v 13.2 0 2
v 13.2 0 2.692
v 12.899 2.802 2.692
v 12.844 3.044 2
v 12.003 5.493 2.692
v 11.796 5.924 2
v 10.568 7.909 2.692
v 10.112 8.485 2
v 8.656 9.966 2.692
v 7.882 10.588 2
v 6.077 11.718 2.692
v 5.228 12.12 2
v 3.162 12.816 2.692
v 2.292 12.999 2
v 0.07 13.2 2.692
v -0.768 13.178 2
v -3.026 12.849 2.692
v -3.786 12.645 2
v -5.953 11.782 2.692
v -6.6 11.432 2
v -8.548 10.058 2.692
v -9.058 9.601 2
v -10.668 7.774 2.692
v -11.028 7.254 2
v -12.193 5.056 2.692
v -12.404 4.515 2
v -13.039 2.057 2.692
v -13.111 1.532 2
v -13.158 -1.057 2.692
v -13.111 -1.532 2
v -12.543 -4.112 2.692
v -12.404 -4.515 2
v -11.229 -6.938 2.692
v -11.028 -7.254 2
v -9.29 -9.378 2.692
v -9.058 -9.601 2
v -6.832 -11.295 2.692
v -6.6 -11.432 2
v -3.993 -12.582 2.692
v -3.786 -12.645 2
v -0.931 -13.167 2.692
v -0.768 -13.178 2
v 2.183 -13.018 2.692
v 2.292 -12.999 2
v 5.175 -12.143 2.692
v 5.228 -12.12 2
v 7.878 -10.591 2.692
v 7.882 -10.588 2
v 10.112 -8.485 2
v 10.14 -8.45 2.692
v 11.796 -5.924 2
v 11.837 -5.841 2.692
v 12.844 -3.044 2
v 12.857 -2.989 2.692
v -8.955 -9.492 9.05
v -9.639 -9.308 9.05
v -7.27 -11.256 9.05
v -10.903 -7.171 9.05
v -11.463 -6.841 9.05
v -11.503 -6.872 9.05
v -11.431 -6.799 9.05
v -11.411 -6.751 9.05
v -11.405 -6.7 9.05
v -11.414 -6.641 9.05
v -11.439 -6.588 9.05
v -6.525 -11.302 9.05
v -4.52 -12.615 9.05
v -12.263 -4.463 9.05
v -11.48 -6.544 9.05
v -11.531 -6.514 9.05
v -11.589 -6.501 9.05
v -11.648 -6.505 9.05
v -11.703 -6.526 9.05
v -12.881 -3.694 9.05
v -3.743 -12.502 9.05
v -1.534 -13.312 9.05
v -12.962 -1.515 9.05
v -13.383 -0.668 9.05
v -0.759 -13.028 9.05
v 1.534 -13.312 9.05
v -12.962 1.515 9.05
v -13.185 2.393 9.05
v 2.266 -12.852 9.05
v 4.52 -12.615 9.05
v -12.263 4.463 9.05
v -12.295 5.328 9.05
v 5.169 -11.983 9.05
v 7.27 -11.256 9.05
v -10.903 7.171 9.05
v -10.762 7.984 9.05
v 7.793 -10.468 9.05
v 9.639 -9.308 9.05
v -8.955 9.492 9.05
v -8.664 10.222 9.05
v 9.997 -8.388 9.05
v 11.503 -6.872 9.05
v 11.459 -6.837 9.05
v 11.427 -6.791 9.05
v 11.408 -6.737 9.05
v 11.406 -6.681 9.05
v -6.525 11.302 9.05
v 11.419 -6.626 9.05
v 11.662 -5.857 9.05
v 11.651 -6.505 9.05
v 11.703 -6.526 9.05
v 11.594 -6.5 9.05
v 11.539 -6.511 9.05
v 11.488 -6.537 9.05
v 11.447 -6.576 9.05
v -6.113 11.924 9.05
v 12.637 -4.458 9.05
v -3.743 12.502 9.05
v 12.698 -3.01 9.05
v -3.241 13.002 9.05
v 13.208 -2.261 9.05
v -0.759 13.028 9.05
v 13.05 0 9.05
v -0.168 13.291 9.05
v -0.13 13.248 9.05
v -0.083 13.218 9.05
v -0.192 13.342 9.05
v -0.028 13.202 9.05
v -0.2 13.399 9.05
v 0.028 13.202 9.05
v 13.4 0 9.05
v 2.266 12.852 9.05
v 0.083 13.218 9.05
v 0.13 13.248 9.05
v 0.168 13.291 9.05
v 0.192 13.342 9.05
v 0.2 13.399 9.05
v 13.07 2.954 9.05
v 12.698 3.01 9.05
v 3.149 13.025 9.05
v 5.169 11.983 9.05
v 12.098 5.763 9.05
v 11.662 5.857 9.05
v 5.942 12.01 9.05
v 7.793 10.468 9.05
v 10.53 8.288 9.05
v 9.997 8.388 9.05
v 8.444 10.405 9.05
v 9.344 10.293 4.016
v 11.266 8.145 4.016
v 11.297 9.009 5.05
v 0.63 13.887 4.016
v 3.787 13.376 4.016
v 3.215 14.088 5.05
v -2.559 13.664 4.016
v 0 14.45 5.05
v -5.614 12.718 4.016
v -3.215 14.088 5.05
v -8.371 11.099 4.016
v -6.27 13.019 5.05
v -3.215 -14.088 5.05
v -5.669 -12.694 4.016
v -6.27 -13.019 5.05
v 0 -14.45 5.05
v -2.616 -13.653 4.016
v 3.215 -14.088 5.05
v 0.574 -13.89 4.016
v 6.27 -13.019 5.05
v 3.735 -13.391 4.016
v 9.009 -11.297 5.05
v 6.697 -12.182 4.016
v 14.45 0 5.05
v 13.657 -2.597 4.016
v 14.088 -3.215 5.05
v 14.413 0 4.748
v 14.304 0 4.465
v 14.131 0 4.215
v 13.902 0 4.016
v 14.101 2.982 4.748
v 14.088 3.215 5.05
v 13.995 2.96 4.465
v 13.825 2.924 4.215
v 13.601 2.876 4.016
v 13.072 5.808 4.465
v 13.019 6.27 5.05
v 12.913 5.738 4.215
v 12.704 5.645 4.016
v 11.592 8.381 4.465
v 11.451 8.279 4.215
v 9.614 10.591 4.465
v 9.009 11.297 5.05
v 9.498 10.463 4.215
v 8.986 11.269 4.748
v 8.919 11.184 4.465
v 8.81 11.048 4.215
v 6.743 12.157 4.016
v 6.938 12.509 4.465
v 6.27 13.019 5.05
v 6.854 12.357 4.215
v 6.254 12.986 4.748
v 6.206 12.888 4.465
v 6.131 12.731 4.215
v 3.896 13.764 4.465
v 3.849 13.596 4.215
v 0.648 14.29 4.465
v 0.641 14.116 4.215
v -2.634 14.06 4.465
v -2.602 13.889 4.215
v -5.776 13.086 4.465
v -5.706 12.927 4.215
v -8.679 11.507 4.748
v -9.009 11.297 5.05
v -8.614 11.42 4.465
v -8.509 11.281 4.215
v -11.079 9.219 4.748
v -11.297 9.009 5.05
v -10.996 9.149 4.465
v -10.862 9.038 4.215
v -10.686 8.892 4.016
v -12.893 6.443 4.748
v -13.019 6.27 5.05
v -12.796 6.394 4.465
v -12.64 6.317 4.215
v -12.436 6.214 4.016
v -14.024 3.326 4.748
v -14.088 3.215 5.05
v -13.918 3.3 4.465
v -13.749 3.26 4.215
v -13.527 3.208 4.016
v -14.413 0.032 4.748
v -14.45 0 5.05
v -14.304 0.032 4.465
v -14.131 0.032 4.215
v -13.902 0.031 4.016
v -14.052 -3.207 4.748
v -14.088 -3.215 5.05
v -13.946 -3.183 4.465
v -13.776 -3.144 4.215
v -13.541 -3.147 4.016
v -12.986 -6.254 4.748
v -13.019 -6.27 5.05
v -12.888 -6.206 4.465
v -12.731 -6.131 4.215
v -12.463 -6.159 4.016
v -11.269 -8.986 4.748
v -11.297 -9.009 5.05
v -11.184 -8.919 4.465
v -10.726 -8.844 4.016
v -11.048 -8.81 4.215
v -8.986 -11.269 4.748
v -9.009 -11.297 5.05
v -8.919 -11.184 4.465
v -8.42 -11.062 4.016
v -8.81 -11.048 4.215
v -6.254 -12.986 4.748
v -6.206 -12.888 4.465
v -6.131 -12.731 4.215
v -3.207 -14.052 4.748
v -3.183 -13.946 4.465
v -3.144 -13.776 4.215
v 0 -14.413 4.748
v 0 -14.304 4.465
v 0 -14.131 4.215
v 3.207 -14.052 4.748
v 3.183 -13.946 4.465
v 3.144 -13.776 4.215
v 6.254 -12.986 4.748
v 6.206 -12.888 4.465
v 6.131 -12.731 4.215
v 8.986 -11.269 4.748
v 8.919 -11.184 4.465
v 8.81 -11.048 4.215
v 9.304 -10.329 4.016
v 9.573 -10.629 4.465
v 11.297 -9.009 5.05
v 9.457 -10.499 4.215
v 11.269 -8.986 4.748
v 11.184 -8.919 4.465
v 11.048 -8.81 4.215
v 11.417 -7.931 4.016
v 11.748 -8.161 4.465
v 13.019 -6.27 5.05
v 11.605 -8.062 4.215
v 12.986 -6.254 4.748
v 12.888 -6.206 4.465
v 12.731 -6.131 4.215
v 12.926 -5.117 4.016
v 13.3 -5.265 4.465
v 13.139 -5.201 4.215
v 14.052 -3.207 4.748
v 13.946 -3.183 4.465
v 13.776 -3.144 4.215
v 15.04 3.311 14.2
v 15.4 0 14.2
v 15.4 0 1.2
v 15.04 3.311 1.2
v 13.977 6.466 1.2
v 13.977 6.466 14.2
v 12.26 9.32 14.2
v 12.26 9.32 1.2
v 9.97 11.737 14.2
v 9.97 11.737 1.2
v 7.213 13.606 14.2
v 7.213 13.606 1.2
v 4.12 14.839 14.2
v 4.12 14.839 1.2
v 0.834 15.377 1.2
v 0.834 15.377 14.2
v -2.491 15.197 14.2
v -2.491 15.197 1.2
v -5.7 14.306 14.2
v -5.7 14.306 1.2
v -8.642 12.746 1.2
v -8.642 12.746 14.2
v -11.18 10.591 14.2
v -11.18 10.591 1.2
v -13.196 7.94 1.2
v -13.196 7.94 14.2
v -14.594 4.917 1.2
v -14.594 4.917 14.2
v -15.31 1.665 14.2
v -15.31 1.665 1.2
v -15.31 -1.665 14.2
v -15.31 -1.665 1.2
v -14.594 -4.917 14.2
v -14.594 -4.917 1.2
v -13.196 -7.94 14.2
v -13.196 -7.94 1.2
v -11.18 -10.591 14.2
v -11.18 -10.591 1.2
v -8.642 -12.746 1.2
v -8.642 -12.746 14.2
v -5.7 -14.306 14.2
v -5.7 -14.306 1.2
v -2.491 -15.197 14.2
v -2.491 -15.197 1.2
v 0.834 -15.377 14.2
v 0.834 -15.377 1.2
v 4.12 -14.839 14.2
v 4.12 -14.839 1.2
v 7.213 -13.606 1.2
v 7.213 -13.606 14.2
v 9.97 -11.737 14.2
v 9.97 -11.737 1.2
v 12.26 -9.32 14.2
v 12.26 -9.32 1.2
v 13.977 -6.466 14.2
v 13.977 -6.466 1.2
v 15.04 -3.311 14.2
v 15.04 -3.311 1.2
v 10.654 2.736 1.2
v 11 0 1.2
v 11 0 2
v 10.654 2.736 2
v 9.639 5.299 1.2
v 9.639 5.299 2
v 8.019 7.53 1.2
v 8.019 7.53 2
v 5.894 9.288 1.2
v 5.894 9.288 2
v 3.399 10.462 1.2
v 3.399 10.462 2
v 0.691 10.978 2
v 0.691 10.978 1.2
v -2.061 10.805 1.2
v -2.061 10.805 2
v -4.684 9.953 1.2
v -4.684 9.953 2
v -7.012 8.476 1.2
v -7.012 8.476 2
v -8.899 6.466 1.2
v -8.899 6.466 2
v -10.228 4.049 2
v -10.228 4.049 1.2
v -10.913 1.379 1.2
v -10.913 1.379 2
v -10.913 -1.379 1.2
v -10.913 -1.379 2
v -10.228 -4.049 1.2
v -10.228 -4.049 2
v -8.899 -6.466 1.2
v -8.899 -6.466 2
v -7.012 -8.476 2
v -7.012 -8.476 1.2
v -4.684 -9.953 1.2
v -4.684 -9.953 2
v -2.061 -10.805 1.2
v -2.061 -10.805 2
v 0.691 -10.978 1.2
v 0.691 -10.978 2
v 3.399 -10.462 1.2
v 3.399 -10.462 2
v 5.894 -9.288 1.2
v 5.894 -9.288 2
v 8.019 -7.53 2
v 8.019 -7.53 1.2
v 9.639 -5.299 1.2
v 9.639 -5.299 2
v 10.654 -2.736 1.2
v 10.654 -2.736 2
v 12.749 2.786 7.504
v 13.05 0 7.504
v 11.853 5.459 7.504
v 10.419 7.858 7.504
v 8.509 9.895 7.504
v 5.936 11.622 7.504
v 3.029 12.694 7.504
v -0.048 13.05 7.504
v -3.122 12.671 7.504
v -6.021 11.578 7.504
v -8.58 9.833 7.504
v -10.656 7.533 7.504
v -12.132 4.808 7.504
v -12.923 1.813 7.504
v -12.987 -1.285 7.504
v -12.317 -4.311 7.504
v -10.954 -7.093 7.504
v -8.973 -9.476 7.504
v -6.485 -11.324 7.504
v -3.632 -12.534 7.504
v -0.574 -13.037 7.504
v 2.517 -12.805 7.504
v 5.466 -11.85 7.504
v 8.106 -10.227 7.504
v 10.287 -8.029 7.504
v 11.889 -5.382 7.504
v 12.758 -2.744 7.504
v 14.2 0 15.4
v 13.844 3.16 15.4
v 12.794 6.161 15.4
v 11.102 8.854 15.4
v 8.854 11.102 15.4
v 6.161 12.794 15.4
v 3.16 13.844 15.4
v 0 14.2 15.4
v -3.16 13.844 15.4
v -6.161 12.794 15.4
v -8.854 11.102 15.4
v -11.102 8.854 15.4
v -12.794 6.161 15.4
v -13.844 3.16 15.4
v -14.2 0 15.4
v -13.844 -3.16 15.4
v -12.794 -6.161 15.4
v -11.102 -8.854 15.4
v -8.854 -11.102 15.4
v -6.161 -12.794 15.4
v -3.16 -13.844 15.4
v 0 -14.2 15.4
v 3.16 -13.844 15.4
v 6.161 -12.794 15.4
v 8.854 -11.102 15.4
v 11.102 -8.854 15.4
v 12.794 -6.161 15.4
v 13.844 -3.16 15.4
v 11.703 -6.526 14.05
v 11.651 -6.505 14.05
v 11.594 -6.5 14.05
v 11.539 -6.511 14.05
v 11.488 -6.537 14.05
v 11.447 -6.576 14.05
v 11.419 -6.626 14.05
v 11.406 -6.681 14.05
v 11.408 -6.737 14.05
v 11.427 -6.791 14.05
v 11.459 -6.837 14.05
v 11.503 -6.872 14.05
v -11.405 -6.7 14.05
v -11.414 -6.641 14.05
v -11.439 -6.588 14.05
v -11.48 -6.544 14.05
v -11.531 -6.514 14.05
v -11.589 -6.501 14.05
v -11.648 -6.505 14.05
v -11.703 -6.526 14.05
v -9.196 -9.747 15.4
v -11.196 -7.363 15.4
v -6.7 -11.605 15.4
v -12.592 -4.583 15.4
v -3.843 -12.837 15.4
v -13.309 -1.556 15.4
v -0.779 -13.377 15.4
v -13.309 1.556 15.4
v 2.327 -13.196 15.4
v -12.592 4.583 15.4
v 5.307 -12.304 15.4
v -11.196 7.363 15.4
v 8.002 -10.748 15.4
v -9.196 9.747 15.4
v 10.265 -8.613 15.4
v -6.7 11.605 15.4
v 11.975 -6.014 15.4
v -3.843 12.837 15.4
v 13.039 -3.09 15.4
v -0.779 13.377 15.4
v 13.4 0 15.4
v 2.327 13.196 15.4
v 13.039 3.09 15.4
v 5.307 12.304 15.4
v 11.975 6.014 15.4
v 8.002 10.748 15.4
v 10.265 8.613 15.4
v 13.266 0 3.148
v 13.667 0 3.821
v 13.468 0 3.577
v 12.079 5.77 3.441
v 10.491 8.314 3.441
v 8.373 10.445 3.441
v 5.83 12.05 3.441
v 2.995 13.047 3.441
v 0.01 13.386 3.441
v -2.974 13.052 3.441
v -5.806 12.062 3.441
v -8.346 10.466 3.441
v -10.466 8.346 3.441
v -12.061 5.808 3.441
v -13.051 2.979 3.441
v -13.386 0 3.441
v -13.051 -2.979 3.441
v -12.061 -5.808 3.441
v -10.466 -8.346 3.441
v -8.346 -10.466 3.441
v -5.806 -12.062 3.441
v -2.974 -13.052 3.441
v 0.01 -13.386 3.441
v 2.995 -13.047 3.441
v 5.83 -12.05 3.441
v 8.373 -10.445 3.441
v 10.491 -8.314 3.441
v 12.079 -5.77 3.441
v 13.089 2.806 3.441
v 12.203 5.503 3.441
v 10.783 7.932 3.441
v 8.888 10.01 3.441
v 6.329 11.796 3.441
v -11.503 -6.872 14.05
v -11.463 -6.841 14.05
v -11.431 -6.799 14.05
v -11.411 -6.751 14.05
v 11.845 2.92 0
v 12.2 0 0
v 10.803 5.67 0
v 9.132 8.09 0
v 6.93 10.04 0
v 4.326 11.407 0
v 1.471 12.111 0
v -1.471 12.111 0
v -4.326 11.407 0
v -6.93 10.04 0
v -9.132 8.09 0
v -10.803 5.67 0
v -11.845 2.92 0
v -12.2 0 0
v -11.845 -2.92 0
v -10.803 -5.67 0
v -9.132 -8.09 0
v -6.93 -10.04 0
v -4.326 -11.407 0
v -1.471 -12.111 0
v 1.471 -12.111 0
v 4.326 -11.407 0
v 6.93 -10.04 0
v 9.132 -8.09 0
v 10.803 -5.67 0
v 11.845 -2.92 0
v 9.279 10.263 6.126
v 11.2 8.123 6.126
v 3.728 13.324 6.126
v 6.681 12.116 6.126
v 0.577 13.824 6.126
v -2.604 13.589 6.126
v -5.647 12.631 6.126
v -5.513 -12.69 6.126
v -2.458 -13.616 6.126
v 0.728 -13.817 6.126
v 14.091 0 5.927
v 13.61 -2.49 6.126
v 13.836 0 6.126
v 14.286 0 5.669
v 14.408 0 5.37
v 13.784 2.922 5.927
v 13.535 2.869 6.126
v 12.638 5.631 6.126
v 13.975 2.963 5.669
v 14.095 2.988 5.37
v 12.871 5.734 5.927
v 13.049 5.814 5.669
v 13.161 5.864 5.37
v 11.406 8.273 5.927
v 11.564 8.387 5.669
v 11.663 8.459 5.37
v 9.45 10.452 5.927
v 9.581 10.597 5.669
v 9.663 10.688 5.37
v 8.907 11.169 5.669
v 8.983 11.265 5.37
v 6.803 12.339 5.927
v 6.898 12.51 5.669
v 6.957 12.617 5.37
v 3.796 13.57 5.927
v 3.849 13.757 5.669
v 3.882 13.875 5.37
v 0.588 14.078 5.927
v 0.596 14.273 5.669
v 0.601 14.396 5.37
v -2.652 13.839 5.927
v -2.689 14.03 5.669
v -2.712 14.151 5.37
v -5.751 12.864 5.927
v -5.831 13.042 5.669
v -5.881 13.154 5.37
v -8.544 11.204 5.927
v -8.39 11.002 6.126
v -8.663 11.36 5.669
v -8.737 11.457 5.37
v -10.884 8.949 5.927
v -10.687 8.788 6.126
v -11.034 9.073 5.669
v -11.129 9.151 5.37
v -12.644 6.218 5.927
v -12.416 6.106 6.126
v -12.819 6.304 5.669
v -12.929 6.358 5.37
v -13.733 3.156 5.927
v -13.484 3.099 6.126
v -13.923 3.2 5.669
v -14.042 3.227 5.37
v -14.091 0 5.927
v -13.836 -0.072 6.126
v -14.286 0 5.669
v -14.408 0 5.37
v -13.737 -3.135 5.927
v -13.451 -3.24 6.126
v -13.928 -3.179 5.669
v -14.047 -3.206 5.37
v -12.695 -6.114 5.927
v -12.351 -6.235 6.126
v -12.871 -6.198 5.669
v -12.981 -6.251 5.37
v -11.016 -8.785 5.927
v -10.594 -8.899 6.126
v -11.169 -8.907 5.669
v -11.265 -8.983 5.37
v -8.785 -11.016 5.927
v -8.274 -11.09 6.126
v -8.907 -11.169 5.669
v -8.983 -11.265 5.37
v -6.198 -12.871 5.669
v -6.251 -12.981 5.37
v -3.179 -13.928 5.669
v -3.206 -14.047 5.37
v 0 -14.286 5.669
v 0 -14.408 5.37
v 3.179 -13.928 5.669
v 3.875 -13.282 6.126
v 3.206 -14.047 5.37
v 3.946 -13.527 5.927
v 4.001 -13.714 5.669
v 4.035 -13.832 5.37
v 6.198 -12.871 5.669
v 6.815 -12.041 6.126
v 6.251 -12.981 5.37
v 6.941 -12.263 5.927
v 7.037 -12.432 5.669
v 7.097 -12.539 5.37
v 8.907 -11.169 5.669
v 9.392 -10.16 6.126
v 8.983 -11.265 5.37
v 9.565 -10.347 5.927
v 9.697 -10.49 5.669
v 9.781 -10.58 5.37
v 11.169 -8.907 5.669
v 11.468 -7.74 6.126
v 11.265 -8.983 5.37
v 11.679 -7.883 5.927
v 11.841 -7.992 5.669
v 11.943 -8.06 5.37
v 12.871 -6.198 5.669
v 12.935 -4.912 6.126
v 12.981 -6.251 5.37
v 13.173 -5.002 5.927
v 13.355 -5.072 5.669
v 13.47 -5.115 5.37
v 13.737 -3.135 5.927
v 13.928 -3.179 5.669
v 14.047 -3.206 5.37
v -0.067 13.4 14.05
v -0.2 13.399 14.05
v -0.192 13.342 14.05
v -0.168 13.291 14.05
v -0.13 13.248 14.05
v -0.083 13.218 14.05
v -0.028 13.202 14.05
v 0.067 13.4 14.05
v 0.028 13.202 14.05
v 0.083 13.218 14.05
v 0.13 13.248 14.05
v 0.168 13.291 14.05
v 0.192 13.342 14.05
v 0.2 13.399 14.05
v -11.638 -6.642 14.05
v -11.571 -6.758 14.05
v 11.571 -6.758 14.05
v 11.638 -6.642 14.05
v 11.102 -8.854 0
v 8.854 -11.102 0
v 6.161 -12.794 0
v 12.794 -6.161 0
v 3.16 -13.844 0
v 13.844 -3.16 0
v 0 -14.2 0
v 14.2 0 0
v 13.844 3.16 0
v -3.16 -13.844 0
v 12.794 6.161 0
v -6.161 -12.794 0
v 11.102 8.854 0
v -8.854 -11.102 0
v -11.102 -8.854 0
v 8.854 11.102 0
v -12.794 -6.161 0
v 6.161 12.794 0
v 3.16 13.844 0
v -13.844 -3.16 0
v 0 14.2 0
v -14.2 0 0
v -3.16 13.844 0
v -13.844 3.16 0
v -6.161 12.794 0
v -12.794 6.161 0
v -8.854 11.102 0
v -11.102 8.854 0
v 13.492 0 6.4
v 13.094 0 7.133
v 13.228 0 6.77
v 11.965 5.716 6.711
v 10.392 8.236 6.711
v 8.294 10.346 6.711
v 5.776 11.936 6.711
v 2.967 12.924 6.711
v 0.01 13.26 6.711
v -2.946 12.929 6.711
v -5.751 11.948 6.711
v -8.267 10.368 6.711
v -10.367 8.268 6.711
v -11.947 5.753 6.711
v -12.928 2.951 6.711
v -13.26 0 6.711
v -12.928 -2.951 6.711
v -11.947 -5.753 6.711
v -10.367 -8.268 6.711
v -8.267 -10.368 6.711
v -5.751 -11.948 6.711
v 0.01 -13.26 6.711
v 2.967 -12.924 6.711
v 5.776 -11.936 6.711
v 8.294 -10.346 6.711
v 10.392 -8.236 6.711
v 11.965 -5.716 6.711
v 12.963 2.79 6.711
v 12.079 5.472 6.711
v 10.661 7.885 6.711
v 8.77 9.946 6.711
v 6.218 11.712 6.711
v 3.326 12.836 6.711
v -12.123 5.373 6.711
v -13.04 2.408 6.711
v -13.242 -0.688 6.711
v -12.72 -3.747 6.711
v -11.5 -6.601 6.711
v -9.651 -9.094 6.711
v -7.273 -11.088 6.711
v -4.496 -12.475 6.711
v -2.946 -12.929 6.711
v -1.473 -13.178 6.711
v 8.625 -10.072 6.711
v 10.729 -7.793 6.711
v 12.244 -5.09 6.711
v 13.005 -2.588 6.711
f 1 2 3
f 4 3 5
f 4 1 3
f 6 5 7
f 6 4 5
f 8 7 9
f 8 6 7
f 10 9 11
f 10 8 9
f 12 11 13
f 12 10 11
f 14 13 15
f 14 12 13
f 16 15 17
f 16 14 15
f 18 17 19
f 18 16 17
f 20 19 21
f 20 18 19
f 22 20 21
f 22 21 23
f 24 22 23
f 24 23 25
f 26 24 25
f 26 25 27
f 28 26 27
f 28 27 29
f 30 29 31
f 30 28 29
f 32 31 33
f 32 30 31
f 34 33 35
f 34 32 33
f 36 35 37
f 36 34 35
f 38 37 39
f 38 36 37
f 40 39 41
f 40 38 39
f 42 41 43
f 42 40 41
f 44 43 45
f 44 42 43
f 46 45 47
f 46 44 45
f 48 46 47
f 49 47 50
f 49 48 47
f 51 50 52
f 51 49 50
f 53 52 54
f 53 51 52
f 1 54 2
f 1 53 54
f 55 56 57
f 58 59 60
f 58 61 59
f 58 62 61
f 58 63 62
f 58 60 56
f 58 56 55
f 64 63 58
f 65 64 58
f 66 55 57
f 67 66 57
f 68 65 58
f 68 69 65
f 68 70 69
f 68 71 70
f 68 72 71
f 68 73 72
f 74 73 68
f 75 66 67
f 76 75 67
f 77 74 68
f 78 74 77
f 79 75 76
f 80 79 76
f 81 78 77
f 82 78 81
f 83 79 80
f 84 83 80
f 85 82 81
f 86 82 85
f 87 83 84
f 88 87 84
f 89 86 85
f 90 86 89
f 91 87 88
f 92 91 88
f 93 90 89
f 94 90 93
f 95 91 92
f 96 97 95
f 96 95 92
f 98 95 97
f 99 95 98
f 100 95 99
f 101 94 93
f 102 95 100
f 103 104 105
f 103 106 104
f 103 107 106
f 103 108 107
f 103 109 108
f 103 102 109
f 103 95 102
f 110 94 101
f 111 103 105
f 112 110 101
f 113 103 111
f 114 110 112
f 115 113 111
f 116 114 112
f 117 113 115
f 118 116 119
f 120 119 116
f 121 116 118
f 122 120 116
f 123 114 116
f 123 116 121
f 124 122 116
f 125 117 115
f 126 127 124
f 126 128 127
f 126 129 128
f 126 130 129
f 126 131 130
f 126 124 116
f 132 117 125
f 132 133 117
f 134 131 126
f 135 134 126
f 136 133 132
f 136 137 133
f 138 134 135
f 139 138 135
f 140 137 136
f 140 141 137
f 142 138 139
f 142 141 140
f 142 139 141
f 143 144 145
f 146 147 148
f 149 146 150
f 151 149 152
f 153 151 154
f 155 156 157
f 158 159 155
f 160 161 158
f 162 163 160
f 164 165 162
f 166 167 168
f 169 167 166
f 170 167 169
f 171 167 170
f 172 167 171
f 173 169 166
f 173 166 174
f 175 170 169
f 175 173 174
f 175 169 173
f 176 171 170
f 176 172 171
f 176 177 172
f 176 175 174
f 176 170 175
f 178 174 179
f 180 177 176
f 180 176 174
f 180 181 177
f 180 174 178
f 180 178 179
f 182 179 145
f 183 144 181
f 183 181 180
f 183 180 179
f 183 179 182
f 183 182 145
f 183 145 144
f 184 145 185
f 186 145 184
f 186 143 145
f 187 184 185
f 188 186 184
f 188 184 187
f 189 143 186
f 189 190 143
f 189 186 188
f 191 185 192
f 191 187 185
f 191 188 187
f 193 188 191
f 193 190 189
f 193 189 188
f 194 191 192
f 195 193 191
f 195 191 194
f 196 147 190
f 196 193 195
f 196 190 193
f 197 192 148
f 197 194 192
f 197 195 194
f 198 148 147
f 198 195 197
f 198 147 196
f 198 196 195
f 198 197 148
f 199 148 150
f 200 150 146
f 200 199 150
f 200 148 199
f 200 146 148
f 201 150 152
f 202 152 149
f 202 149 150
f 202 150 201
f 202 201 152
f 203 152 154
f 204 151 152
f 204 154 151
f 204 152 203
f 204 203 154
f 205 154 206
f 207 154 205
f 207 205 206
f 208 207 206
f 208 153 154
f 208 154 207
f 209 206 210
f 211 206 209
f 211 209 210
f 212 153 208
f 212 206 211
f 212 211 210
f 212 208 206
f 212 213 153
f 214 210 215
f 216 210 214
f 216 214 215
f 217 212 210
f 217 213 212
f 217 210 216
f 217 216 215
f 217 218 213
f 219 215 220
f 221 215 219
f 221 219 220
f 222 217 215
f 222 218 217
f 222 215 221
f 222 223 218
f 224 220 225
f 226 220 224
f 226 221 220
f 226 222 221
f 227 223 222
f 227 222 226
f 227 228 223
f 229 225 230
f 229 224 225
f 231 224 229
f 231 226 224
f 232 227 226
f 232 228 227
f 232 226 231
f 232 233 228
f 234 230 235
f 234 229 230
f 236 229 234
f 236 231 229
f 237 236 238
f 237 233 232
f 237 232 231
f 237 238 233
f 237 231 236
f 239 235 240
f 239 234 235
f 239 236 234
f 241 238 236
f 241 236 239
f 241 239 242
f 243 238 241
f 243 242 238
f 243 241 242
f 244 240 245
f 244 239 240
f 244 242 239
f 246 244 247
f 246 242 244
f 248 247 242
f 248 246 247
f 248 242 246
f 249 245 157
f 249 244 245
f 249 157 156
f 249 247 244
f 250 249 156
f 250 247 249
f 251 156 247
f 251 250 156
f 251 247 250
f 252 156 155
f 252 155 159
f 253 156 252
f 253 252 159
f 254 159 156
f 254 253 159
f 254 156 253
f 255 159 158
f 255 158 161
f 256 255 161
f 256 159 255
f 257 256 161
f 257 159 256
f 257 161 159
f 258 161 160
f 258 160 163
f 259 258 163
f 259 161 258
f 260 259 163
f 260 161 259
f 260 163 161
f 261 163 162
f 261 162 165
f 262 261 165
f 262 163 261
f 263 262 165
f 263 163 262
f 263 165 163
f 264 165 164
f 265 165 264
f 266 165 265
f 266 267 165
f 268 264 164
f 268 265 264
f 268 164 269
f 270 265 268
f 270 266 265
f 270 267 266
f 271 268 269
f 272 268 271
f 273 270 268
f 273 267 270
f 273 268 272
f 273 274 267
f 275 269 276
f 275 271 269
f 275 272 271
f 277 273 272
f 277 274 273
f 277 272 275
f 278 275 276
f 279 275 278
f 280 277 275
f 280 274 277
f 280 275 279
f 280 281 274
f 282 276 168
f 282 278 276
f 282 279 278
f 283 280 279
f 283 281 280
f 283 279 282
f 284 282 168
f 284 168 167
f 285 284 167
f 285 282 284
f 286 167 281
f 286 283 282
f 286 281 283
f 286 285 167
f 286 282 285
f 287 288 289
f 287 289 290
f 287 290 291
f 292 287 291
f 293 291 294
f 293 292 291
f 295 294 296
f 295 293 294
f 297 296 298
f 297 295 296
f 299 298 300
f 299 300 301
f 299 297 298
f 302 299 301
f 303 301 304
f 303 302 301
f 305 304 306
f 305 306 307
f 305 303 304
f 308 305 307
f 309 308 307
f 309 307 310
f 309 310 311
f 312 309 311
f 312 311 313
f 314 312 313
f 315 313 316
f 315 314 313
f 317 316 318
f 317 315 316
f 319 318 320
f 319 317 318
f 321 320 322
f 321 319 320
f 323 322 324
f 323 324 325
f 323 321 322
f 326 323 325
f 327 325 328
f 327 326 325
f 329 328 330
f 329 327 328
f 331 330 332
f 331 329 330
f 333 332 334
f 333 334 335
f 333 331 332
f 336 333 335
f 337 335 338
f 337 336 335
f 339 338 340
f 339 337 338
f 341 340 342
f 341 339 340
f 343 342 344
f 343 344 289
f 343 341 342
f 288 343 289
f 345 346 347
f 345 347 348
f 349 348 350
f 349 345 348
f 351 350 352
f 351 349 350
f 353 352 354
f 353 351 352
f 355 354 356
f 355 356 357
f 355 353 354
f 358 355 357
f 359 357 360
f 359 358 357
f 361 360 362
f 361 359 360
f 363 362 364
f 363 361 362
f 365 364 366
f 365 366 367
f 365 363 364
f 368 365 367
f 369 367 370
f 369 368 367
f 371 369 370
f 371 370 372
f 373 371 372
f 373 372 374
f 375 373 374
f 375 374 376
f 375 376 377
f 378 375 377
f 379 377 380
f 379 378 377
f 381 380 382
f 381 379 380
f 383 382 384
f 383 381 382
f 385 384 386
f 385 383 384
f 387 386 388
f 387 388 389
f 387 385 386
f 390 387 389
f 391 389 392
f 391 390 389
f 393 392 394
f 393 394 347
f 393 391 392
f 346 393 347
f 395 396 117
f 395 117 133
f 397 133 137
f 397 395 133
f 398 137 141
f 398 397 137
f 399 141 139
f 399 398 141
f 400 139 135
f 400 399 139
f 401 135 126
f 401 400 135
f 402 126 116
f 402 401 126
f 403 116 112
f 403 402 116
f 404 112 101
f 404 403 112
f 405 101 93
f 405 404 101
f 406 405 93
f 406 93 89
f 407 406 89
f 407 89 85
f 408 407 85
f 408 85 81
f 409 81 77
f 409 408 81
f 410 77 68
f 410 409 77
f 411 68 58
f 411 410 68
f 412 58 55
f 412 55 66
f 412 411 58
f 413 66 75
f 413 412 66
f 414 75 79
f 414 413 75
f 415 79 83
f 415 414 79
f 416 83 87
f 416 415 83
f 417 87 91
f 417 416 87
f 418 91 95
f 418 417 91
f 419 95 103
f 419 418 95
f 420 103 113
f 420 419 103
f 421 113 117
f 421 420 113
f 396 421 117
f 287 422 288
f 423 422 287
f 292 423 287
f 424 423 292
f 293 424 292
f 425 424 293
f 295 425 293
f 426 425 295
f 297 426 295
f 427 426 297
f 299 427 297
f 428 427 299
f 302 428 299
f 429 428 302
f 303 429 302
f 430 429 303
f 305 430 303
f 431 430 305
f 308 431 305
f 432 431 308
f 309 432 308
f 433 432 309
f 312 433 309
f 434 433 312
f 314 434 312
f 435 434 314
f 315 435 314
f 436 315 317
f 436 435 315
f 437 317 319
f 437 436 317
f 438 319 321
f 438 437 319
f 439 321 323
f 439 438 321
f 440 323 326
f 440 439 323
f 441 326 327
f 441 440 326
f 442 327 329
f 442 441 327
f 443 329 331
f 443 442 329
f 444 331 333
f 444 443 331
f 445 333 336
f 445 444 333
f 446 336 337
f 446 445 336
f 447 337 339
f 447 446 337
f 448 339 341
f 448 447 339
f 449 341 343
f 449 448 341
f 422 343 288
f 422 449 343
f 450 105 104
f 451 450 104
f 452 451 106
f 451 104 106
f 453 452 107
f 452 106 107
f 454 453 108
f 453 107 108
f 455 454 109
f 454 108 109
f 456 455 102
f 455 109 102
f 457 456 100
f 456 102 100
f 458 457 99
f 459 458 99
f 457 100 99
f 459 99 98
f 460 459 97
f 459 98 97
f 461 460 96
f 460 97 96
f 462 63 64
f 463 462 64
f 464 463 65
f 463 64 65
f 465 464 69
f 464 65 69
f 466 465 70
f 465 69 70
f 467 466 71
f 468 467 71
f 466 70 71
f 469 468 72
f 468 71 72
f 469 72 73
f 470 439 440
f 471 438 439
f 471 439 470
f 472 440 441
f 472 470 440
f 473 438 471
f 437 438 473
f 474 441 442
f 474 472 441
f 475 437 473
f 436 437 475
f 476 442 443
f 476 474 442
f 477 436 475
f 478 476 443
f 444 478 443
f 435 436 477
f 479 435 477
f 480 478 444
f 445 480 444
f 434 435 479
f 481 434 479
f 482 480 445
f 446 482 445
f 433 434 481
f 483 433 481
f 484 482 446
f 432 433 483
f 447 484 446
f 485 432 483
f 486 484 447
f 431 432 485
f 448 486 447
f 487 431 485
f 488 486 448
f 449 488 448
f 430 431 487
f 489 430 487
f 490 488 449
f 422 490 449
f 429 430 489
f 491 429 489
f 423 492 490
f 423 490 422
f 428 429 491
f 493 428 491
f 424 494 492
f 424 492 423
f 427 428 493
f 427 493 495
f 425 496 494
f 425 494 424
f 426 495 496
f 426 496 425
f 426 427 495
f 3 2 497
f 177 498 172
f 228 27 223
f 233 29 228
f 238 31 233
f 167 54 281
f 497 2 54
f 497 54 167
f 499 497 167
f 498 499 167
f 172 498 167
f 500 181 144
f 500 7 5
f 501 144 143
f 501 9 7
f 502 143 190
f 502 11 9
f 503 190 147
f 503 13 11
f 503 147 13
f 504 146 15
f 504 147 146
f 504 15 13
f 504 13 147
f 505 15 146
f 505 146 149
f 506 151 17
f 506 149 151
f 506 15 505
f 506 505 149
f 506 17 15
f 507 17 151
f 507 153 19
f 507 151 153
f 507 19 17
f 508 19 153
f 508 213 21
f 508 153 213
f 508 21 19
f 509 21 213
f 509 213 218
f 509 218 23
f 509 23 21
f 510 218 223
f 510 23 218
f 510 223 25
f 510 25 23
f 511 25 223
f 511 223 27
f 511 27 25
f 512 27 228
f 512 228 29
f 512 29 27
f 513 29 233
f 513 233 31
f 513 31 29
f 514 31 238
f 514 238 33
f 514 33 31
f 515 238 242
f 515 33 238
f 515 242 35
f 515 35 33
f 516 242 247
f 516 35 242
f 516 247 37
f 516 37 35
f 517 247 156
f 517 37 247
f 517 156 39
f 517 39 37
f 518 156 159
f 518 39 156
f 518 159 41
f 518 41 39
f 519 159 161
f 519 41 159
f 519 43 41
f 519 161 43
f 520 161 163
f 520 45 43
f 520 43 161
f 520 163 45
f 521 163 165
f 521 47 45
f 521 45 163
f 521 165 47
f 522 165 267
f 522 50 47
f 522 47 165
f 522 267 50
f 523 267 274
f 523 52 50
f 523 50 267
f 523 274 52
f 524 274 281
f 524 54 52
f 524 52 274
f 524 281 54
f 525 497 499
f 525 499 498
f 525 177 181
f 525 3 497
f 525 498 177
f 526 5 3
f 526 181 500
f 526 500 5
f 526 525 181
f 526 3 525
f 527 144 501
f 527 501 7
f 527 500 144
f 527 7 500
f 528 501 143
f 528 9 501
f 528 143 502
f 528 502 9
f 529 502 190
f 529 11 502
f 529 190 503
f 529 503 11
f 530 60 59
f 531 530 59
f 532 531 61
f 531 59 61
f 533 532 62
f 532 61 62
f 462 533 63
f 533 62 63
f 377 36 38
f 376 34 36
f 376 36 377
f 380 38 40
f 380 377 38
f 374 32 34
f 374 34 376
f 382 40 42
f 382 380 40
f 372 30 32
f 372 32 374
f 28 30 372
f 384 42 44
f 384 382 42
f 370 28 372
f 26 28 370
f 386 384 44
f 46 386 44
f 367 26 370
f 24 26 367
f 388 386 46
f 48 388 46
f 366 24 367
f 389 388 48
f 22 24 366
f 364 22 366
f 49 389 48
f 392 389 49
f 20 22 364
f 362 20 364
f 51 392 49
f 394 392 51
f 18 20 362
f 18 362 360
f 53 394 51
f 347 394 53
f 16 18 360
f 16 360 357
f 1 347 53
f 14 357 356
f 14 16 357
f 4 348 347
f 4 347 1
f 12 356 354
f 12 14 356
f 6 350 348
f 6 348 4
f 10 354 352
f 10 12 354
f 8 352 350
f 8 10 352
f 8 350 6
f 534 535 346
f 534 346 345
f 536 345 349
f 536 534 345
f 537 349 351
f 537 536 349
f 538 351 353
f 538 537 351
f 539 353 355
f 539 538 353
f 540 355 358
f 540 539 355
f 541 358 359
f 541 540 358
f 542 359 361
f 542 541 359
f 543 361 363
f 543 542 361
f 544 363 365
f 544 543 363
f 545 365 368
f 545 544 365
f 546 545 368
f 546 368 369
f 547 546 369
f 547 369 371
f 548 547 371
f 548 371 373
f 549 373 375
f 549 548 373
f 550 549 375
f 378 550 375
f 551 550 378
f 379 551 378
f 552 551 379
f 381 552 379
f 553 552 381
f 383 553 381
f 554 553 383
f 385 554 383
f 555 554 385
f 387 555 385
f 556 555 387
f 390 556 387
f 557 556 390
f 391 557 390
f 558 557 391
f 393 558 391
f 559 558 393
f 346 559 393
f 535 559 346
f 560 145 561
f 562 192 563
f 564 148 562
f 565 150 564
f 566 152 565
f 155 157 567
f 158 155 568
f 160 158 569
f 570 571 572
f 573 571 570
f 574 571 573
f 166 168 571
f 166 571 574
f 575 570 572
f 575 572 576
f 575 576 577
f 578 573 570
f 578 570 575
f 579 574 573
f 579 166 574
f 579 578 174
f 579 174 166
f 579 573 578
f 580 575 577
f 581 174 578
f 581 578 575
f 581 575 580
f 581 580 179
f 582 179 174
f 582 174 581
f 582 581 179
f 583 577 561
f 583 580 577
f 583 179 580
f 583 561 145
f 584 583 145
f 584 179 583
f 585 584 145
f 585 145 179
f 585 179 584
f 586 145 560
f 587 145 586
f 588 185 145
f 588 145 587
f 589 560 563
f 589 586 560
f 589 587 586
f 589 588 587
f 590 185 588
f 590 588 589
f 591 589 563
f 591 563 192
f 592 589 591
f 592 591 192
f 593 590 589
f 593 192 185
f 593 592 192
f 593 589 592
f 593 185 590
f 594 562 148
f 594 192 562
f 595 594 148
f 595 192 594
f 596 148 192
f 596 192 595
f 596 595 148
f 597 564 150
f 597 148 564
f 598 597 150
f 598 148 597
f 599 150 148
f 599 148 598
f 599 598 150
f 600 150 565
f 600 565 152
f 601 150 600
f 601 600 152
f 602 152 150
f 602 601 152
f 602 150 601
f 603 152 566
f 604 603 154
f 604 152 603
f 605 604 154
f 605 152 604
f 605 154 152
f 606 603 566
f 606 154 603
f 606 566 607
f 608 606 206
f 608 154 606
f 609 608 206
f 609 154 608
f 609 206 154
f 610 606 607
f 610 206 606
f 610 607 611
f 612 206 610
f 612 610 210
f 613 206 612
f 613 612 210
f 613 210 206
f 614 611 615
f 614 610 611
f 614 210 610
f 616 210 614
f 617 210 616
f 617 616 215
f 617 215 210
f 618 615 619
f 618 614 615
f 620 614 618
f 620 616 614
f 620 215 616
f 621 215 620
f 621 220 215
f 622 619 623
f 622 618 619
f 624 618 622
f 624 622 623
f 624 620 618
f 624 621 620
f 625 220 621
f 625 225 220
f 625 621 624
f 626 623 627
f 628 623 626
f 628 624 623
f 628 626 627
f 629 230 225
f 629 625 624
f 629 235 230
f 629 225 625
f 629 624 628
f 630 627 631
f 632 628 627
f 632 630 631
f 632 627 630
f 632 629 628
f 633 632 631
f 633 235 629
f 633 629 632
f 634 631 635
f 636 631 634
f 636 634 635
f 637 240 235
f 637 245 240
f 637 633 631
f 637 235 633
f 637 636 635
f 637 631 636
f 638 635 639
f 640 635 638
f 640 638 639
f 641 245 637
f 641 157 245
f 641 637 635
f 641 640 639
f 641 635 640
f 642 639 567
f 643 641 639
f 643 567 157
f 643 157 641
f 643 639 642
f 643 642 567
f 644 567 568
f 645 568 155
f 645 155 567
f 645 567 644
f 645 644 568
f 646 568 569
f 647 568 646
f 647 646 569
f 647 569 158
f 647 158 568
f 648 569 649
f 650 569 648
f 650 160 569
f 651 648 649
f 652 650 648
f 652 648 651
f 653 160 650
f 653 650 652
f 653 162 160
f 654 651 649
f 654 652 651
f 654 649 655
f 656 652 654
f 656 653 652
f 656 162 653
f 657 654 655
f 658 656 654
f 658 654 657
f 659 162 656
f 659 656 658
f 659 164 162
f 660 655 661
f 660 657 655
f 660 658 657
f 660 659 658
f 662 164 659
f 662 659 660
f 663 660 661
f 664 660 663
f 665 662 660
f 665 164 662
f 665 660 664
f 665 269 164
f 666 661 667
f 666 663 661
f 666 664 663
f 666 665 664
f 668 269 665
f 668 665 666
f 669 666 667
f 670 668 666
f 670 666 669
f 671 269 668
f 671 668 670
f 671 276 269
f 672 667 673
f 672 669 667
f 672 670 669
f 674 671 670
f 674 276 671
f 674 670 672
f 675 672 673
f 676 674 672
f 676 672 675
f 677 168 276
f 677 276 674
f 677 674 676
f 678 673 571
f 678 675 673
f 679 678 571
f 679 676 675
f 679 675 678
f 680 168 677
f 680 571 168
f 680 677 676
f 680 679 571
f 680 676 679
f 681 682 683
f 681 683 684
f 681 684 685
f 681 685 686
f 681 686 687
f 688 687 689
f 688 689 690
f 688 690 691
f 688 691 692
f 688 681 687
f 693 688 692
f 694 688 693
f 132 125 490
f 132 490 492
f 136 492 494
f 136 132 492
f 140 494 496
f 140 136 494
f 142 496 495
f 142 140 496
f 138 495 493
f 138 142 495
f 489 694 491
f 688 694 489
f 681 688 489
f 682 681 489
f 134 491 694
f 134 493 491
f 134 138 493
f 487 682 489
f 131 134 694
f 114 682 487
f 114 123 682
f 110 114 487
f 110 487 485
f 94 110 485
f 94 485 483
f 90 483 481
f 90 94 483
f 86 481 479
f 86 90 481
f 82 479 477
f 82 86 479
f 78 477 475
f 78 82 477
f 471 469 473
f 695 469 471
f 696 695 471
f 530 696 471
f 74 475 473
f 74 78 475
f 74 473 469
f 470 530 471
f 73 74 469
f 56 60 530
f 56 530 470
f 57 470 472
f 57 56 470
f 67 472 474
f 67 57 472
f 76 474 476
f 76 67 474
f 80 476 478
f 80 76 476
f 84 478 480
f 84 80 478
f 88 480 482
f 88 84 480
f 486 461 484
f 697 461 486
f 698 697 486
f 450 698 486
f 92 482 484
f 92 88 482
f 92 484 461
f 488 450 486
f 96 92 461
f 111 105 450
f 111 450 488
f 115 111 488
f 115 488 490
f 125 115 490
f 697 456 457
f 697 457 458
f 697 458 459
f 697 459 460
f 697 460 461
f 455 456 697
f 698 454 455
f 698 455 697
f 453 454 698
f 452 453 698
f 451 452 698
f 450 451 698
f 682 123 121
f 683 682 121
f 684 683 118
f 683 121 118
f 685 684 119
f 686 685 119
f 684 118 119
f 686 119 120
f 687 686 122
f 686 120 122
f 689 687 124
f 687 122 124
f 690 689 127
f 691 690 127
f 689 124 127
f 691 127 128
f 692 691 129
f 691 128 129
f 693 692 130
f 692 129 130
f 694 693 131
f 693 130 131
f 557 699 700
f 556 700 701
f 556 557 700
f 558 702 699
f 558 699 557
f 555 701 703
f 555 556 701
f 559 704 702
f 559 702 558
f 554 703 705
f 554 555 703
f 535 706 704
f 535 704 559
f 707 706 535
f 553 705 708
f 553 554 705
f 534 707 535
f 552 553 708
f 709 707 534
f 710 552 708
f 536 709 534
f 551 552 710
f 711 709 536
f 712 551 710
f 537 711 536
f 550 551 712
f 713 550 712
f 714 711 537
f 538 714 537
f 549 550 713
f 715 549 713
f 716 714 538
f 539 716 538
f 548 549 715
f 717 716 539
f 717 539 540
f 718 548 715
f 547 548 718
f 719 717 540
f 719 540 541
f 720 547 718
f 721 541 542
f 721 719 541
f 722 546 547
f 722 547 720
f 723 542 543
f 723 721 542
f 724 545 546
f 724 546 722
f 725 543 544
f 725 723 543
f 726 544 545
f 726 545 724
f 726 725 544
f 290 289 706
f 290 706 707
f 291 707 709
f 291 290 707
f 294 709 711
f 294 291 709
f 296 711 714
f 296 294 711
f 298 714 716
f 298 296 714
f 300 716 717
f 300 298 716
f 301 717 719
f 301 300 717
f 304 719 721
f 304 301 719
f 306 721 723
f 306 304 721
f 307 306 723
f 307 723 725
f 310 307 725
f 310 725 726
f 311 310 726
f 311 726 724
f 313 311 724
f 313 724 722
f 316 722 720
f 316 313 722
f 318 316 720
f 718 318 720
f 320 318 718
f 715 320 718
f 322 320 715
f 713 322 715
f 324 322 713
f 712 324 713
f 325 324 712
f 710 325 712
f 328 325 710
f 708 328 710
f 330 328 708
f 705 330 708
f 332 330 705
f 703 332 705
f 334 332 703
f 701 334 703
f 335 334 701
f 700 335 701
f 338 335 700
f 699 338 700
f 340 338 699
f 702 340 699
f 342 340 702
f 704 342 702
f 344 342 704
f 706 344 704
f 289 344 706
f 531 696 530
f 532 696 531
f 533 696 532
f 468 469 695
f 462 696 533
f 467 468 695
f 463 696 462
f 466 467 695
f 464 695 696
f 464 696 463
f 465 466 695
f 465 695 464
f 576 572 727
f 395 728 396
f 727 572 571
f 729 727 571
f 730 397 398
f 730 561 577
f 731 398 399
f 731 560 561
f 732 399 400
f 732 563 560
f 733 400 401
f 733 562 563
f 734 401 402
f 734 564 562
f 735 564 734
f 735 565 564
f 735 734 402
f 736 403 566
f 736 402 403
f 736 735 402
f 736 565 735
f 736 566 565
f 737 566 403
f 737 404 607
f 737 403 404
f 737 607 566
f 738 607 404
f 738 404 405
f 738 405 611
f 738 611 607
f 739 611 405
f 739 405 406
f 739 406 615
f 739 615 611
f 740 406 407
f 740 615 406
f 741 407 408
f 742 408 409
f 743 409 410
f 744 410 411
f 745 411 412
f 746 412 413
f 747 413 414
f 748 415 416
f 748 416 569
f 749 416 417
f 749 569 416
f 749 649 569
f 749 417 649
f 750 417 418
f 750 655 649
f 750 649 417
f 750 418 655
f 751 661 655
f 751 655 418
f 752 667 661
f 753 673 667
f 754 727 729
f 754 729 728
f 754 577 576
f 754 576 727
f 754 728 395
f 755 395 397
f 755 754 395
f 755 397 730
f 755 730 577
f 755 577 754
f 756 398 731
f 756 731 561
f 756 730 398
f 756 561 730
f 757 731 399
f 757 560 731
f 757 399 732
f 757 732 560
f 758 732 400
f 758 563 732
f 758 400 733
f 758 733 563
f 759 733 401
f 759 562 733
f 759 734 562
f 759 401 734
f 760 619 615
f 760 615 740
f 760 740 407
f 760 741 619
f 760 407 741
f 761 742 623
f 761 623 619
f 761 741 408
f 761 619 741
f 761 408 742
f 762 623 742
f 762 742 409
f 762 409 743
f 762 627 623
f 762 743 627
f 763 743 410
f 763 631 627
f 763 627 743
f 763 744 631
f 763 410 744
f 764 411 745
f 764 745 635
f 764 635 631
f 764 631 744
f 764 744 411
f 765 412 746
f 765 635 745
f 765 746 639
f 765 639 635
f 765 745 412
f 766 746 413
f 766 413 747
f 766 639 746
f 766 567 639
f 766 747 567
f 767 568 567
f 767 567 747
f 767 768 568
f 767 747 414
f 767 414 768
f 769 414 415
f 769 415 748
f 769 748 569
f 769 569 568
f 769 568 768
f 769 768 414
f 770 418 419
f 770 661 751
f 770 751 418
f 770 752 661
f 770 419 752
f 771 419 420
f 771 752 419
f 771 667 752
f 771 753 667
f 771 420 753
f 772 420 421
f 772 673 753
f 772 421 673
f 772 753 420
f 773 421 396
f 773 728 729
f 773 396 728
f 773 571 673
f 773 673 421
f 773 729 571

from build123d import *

# Parameters (mm, degrees)
F2_SIZE  = 1.2
F3_R     = 1.6
F5_DEPTH = 5


# Not quite as in the source:
# - a feature names something its author has since deleted; it is built from what else it names


with BuildPart() as f1:
    # F0 (on Front) → F1 (revolve)
    with BuildSketch(Plane.XZ):
        with BuildLine():
            ThreePointArc((13.05, 6.2909673646), (14.0291561976, 5.9854143467), (14.45, 5.05))
            ThreePointArc((14.45, 5.05), (14.0838834765, 4.1661165235), (13.2, 3.8))
            Line((13.2, 3.8), (13.2, 2))
            Line((13.2, 2), (11, 2))
            Line((11, 2), (11, 0))
            Line((11, 0), (15.4, 0))
            Line((15.4, 0), (15.4, 15.4))
            Line((15.4, 15.4), (13.4, 15.4))
            Line((13.4, 15.4), (13.4, 9.05))
            Line((13.4, 9.05), (13.05, 9.05))
            Line((13.05, 9.05), (13.05, 6.2909673646))
        make_face()
    revolve(axis=Axis((0, 0, 9.4043305144), (0, 0, 1)))

    # F2
    f2_edges = [f1.edges().sort_by_distance(p)[0] for p in [
        (-11, 0, 0),
        (-15.4, 0, 0),
        (-15.4, 0, 15.4),
    ]]
    chamfer(f2_edges, length=F2_SIZE)

    # F3
    f3_edges = [f1.edges().sort_by_distance(p)[0] for p in [
        (-13.05, 0, 6.290967),
        (-13.2, 0, 3.8),
    ]]
    fillet(f3_edges, radius=F3_R)

    # F4 (on face) → F5 (join)
    with BuildSketch(Plane.XY.offset(9.05)):
        with BuildLine():
            ThreePointArc((0.1999944308, 13.3985074627), (0.1999986077, 13.3992537261), (0.2, 13.4))
            ThreePointArc((0.2, 13.4), (-0.0007462739, 13.5999986077), (-0.1999944308, 13.3985074627))
            ThreePointArc((-0.1999944308, 13.3985074627), (0, 13.4), (0.1999944308, 13.3985074627))
        make_face()
        with BuildLine():
            ThreePointArc((0.1999944308, 13.3985074627), (0, 13.4), (-0.1999944308, 13.3985074627))
            ThreePointArc((-0.1999944308, 13.3985074627), (0, 13.2), (0.1999944308, 13.3985074627))
        make_face()
        with BuildLine():
            ThreePointArc((-11.4047404107, -6.7), (-11.5040948148, -6.527169262), (-11.7034450509, -6.5260534737))
            ThreePointArc((-11.7034450509, -6.5260534737), (-11.6047404107, -6.7), (-11.5034506201, -6.872453989))
            ThreePointArc((-11.5034506201, -6.872453989), (-11.4311633988, -6.7993530117), (-11.4047404107, -6.7))
        make_face()
        with BuildLine():
            ThreePointArc((11.5034506201, -6.872453989), (11.6047404107, -6.7), (11.7034450509, -6.5260534737))
            ThreePointArc((11.7034450509, -6.5260534737), (11.43153533, -6.6), (11.5034506201, -6.872453989))
        make_face()
    extrude(amount=F5_DEPTH)


solid = f1.part
